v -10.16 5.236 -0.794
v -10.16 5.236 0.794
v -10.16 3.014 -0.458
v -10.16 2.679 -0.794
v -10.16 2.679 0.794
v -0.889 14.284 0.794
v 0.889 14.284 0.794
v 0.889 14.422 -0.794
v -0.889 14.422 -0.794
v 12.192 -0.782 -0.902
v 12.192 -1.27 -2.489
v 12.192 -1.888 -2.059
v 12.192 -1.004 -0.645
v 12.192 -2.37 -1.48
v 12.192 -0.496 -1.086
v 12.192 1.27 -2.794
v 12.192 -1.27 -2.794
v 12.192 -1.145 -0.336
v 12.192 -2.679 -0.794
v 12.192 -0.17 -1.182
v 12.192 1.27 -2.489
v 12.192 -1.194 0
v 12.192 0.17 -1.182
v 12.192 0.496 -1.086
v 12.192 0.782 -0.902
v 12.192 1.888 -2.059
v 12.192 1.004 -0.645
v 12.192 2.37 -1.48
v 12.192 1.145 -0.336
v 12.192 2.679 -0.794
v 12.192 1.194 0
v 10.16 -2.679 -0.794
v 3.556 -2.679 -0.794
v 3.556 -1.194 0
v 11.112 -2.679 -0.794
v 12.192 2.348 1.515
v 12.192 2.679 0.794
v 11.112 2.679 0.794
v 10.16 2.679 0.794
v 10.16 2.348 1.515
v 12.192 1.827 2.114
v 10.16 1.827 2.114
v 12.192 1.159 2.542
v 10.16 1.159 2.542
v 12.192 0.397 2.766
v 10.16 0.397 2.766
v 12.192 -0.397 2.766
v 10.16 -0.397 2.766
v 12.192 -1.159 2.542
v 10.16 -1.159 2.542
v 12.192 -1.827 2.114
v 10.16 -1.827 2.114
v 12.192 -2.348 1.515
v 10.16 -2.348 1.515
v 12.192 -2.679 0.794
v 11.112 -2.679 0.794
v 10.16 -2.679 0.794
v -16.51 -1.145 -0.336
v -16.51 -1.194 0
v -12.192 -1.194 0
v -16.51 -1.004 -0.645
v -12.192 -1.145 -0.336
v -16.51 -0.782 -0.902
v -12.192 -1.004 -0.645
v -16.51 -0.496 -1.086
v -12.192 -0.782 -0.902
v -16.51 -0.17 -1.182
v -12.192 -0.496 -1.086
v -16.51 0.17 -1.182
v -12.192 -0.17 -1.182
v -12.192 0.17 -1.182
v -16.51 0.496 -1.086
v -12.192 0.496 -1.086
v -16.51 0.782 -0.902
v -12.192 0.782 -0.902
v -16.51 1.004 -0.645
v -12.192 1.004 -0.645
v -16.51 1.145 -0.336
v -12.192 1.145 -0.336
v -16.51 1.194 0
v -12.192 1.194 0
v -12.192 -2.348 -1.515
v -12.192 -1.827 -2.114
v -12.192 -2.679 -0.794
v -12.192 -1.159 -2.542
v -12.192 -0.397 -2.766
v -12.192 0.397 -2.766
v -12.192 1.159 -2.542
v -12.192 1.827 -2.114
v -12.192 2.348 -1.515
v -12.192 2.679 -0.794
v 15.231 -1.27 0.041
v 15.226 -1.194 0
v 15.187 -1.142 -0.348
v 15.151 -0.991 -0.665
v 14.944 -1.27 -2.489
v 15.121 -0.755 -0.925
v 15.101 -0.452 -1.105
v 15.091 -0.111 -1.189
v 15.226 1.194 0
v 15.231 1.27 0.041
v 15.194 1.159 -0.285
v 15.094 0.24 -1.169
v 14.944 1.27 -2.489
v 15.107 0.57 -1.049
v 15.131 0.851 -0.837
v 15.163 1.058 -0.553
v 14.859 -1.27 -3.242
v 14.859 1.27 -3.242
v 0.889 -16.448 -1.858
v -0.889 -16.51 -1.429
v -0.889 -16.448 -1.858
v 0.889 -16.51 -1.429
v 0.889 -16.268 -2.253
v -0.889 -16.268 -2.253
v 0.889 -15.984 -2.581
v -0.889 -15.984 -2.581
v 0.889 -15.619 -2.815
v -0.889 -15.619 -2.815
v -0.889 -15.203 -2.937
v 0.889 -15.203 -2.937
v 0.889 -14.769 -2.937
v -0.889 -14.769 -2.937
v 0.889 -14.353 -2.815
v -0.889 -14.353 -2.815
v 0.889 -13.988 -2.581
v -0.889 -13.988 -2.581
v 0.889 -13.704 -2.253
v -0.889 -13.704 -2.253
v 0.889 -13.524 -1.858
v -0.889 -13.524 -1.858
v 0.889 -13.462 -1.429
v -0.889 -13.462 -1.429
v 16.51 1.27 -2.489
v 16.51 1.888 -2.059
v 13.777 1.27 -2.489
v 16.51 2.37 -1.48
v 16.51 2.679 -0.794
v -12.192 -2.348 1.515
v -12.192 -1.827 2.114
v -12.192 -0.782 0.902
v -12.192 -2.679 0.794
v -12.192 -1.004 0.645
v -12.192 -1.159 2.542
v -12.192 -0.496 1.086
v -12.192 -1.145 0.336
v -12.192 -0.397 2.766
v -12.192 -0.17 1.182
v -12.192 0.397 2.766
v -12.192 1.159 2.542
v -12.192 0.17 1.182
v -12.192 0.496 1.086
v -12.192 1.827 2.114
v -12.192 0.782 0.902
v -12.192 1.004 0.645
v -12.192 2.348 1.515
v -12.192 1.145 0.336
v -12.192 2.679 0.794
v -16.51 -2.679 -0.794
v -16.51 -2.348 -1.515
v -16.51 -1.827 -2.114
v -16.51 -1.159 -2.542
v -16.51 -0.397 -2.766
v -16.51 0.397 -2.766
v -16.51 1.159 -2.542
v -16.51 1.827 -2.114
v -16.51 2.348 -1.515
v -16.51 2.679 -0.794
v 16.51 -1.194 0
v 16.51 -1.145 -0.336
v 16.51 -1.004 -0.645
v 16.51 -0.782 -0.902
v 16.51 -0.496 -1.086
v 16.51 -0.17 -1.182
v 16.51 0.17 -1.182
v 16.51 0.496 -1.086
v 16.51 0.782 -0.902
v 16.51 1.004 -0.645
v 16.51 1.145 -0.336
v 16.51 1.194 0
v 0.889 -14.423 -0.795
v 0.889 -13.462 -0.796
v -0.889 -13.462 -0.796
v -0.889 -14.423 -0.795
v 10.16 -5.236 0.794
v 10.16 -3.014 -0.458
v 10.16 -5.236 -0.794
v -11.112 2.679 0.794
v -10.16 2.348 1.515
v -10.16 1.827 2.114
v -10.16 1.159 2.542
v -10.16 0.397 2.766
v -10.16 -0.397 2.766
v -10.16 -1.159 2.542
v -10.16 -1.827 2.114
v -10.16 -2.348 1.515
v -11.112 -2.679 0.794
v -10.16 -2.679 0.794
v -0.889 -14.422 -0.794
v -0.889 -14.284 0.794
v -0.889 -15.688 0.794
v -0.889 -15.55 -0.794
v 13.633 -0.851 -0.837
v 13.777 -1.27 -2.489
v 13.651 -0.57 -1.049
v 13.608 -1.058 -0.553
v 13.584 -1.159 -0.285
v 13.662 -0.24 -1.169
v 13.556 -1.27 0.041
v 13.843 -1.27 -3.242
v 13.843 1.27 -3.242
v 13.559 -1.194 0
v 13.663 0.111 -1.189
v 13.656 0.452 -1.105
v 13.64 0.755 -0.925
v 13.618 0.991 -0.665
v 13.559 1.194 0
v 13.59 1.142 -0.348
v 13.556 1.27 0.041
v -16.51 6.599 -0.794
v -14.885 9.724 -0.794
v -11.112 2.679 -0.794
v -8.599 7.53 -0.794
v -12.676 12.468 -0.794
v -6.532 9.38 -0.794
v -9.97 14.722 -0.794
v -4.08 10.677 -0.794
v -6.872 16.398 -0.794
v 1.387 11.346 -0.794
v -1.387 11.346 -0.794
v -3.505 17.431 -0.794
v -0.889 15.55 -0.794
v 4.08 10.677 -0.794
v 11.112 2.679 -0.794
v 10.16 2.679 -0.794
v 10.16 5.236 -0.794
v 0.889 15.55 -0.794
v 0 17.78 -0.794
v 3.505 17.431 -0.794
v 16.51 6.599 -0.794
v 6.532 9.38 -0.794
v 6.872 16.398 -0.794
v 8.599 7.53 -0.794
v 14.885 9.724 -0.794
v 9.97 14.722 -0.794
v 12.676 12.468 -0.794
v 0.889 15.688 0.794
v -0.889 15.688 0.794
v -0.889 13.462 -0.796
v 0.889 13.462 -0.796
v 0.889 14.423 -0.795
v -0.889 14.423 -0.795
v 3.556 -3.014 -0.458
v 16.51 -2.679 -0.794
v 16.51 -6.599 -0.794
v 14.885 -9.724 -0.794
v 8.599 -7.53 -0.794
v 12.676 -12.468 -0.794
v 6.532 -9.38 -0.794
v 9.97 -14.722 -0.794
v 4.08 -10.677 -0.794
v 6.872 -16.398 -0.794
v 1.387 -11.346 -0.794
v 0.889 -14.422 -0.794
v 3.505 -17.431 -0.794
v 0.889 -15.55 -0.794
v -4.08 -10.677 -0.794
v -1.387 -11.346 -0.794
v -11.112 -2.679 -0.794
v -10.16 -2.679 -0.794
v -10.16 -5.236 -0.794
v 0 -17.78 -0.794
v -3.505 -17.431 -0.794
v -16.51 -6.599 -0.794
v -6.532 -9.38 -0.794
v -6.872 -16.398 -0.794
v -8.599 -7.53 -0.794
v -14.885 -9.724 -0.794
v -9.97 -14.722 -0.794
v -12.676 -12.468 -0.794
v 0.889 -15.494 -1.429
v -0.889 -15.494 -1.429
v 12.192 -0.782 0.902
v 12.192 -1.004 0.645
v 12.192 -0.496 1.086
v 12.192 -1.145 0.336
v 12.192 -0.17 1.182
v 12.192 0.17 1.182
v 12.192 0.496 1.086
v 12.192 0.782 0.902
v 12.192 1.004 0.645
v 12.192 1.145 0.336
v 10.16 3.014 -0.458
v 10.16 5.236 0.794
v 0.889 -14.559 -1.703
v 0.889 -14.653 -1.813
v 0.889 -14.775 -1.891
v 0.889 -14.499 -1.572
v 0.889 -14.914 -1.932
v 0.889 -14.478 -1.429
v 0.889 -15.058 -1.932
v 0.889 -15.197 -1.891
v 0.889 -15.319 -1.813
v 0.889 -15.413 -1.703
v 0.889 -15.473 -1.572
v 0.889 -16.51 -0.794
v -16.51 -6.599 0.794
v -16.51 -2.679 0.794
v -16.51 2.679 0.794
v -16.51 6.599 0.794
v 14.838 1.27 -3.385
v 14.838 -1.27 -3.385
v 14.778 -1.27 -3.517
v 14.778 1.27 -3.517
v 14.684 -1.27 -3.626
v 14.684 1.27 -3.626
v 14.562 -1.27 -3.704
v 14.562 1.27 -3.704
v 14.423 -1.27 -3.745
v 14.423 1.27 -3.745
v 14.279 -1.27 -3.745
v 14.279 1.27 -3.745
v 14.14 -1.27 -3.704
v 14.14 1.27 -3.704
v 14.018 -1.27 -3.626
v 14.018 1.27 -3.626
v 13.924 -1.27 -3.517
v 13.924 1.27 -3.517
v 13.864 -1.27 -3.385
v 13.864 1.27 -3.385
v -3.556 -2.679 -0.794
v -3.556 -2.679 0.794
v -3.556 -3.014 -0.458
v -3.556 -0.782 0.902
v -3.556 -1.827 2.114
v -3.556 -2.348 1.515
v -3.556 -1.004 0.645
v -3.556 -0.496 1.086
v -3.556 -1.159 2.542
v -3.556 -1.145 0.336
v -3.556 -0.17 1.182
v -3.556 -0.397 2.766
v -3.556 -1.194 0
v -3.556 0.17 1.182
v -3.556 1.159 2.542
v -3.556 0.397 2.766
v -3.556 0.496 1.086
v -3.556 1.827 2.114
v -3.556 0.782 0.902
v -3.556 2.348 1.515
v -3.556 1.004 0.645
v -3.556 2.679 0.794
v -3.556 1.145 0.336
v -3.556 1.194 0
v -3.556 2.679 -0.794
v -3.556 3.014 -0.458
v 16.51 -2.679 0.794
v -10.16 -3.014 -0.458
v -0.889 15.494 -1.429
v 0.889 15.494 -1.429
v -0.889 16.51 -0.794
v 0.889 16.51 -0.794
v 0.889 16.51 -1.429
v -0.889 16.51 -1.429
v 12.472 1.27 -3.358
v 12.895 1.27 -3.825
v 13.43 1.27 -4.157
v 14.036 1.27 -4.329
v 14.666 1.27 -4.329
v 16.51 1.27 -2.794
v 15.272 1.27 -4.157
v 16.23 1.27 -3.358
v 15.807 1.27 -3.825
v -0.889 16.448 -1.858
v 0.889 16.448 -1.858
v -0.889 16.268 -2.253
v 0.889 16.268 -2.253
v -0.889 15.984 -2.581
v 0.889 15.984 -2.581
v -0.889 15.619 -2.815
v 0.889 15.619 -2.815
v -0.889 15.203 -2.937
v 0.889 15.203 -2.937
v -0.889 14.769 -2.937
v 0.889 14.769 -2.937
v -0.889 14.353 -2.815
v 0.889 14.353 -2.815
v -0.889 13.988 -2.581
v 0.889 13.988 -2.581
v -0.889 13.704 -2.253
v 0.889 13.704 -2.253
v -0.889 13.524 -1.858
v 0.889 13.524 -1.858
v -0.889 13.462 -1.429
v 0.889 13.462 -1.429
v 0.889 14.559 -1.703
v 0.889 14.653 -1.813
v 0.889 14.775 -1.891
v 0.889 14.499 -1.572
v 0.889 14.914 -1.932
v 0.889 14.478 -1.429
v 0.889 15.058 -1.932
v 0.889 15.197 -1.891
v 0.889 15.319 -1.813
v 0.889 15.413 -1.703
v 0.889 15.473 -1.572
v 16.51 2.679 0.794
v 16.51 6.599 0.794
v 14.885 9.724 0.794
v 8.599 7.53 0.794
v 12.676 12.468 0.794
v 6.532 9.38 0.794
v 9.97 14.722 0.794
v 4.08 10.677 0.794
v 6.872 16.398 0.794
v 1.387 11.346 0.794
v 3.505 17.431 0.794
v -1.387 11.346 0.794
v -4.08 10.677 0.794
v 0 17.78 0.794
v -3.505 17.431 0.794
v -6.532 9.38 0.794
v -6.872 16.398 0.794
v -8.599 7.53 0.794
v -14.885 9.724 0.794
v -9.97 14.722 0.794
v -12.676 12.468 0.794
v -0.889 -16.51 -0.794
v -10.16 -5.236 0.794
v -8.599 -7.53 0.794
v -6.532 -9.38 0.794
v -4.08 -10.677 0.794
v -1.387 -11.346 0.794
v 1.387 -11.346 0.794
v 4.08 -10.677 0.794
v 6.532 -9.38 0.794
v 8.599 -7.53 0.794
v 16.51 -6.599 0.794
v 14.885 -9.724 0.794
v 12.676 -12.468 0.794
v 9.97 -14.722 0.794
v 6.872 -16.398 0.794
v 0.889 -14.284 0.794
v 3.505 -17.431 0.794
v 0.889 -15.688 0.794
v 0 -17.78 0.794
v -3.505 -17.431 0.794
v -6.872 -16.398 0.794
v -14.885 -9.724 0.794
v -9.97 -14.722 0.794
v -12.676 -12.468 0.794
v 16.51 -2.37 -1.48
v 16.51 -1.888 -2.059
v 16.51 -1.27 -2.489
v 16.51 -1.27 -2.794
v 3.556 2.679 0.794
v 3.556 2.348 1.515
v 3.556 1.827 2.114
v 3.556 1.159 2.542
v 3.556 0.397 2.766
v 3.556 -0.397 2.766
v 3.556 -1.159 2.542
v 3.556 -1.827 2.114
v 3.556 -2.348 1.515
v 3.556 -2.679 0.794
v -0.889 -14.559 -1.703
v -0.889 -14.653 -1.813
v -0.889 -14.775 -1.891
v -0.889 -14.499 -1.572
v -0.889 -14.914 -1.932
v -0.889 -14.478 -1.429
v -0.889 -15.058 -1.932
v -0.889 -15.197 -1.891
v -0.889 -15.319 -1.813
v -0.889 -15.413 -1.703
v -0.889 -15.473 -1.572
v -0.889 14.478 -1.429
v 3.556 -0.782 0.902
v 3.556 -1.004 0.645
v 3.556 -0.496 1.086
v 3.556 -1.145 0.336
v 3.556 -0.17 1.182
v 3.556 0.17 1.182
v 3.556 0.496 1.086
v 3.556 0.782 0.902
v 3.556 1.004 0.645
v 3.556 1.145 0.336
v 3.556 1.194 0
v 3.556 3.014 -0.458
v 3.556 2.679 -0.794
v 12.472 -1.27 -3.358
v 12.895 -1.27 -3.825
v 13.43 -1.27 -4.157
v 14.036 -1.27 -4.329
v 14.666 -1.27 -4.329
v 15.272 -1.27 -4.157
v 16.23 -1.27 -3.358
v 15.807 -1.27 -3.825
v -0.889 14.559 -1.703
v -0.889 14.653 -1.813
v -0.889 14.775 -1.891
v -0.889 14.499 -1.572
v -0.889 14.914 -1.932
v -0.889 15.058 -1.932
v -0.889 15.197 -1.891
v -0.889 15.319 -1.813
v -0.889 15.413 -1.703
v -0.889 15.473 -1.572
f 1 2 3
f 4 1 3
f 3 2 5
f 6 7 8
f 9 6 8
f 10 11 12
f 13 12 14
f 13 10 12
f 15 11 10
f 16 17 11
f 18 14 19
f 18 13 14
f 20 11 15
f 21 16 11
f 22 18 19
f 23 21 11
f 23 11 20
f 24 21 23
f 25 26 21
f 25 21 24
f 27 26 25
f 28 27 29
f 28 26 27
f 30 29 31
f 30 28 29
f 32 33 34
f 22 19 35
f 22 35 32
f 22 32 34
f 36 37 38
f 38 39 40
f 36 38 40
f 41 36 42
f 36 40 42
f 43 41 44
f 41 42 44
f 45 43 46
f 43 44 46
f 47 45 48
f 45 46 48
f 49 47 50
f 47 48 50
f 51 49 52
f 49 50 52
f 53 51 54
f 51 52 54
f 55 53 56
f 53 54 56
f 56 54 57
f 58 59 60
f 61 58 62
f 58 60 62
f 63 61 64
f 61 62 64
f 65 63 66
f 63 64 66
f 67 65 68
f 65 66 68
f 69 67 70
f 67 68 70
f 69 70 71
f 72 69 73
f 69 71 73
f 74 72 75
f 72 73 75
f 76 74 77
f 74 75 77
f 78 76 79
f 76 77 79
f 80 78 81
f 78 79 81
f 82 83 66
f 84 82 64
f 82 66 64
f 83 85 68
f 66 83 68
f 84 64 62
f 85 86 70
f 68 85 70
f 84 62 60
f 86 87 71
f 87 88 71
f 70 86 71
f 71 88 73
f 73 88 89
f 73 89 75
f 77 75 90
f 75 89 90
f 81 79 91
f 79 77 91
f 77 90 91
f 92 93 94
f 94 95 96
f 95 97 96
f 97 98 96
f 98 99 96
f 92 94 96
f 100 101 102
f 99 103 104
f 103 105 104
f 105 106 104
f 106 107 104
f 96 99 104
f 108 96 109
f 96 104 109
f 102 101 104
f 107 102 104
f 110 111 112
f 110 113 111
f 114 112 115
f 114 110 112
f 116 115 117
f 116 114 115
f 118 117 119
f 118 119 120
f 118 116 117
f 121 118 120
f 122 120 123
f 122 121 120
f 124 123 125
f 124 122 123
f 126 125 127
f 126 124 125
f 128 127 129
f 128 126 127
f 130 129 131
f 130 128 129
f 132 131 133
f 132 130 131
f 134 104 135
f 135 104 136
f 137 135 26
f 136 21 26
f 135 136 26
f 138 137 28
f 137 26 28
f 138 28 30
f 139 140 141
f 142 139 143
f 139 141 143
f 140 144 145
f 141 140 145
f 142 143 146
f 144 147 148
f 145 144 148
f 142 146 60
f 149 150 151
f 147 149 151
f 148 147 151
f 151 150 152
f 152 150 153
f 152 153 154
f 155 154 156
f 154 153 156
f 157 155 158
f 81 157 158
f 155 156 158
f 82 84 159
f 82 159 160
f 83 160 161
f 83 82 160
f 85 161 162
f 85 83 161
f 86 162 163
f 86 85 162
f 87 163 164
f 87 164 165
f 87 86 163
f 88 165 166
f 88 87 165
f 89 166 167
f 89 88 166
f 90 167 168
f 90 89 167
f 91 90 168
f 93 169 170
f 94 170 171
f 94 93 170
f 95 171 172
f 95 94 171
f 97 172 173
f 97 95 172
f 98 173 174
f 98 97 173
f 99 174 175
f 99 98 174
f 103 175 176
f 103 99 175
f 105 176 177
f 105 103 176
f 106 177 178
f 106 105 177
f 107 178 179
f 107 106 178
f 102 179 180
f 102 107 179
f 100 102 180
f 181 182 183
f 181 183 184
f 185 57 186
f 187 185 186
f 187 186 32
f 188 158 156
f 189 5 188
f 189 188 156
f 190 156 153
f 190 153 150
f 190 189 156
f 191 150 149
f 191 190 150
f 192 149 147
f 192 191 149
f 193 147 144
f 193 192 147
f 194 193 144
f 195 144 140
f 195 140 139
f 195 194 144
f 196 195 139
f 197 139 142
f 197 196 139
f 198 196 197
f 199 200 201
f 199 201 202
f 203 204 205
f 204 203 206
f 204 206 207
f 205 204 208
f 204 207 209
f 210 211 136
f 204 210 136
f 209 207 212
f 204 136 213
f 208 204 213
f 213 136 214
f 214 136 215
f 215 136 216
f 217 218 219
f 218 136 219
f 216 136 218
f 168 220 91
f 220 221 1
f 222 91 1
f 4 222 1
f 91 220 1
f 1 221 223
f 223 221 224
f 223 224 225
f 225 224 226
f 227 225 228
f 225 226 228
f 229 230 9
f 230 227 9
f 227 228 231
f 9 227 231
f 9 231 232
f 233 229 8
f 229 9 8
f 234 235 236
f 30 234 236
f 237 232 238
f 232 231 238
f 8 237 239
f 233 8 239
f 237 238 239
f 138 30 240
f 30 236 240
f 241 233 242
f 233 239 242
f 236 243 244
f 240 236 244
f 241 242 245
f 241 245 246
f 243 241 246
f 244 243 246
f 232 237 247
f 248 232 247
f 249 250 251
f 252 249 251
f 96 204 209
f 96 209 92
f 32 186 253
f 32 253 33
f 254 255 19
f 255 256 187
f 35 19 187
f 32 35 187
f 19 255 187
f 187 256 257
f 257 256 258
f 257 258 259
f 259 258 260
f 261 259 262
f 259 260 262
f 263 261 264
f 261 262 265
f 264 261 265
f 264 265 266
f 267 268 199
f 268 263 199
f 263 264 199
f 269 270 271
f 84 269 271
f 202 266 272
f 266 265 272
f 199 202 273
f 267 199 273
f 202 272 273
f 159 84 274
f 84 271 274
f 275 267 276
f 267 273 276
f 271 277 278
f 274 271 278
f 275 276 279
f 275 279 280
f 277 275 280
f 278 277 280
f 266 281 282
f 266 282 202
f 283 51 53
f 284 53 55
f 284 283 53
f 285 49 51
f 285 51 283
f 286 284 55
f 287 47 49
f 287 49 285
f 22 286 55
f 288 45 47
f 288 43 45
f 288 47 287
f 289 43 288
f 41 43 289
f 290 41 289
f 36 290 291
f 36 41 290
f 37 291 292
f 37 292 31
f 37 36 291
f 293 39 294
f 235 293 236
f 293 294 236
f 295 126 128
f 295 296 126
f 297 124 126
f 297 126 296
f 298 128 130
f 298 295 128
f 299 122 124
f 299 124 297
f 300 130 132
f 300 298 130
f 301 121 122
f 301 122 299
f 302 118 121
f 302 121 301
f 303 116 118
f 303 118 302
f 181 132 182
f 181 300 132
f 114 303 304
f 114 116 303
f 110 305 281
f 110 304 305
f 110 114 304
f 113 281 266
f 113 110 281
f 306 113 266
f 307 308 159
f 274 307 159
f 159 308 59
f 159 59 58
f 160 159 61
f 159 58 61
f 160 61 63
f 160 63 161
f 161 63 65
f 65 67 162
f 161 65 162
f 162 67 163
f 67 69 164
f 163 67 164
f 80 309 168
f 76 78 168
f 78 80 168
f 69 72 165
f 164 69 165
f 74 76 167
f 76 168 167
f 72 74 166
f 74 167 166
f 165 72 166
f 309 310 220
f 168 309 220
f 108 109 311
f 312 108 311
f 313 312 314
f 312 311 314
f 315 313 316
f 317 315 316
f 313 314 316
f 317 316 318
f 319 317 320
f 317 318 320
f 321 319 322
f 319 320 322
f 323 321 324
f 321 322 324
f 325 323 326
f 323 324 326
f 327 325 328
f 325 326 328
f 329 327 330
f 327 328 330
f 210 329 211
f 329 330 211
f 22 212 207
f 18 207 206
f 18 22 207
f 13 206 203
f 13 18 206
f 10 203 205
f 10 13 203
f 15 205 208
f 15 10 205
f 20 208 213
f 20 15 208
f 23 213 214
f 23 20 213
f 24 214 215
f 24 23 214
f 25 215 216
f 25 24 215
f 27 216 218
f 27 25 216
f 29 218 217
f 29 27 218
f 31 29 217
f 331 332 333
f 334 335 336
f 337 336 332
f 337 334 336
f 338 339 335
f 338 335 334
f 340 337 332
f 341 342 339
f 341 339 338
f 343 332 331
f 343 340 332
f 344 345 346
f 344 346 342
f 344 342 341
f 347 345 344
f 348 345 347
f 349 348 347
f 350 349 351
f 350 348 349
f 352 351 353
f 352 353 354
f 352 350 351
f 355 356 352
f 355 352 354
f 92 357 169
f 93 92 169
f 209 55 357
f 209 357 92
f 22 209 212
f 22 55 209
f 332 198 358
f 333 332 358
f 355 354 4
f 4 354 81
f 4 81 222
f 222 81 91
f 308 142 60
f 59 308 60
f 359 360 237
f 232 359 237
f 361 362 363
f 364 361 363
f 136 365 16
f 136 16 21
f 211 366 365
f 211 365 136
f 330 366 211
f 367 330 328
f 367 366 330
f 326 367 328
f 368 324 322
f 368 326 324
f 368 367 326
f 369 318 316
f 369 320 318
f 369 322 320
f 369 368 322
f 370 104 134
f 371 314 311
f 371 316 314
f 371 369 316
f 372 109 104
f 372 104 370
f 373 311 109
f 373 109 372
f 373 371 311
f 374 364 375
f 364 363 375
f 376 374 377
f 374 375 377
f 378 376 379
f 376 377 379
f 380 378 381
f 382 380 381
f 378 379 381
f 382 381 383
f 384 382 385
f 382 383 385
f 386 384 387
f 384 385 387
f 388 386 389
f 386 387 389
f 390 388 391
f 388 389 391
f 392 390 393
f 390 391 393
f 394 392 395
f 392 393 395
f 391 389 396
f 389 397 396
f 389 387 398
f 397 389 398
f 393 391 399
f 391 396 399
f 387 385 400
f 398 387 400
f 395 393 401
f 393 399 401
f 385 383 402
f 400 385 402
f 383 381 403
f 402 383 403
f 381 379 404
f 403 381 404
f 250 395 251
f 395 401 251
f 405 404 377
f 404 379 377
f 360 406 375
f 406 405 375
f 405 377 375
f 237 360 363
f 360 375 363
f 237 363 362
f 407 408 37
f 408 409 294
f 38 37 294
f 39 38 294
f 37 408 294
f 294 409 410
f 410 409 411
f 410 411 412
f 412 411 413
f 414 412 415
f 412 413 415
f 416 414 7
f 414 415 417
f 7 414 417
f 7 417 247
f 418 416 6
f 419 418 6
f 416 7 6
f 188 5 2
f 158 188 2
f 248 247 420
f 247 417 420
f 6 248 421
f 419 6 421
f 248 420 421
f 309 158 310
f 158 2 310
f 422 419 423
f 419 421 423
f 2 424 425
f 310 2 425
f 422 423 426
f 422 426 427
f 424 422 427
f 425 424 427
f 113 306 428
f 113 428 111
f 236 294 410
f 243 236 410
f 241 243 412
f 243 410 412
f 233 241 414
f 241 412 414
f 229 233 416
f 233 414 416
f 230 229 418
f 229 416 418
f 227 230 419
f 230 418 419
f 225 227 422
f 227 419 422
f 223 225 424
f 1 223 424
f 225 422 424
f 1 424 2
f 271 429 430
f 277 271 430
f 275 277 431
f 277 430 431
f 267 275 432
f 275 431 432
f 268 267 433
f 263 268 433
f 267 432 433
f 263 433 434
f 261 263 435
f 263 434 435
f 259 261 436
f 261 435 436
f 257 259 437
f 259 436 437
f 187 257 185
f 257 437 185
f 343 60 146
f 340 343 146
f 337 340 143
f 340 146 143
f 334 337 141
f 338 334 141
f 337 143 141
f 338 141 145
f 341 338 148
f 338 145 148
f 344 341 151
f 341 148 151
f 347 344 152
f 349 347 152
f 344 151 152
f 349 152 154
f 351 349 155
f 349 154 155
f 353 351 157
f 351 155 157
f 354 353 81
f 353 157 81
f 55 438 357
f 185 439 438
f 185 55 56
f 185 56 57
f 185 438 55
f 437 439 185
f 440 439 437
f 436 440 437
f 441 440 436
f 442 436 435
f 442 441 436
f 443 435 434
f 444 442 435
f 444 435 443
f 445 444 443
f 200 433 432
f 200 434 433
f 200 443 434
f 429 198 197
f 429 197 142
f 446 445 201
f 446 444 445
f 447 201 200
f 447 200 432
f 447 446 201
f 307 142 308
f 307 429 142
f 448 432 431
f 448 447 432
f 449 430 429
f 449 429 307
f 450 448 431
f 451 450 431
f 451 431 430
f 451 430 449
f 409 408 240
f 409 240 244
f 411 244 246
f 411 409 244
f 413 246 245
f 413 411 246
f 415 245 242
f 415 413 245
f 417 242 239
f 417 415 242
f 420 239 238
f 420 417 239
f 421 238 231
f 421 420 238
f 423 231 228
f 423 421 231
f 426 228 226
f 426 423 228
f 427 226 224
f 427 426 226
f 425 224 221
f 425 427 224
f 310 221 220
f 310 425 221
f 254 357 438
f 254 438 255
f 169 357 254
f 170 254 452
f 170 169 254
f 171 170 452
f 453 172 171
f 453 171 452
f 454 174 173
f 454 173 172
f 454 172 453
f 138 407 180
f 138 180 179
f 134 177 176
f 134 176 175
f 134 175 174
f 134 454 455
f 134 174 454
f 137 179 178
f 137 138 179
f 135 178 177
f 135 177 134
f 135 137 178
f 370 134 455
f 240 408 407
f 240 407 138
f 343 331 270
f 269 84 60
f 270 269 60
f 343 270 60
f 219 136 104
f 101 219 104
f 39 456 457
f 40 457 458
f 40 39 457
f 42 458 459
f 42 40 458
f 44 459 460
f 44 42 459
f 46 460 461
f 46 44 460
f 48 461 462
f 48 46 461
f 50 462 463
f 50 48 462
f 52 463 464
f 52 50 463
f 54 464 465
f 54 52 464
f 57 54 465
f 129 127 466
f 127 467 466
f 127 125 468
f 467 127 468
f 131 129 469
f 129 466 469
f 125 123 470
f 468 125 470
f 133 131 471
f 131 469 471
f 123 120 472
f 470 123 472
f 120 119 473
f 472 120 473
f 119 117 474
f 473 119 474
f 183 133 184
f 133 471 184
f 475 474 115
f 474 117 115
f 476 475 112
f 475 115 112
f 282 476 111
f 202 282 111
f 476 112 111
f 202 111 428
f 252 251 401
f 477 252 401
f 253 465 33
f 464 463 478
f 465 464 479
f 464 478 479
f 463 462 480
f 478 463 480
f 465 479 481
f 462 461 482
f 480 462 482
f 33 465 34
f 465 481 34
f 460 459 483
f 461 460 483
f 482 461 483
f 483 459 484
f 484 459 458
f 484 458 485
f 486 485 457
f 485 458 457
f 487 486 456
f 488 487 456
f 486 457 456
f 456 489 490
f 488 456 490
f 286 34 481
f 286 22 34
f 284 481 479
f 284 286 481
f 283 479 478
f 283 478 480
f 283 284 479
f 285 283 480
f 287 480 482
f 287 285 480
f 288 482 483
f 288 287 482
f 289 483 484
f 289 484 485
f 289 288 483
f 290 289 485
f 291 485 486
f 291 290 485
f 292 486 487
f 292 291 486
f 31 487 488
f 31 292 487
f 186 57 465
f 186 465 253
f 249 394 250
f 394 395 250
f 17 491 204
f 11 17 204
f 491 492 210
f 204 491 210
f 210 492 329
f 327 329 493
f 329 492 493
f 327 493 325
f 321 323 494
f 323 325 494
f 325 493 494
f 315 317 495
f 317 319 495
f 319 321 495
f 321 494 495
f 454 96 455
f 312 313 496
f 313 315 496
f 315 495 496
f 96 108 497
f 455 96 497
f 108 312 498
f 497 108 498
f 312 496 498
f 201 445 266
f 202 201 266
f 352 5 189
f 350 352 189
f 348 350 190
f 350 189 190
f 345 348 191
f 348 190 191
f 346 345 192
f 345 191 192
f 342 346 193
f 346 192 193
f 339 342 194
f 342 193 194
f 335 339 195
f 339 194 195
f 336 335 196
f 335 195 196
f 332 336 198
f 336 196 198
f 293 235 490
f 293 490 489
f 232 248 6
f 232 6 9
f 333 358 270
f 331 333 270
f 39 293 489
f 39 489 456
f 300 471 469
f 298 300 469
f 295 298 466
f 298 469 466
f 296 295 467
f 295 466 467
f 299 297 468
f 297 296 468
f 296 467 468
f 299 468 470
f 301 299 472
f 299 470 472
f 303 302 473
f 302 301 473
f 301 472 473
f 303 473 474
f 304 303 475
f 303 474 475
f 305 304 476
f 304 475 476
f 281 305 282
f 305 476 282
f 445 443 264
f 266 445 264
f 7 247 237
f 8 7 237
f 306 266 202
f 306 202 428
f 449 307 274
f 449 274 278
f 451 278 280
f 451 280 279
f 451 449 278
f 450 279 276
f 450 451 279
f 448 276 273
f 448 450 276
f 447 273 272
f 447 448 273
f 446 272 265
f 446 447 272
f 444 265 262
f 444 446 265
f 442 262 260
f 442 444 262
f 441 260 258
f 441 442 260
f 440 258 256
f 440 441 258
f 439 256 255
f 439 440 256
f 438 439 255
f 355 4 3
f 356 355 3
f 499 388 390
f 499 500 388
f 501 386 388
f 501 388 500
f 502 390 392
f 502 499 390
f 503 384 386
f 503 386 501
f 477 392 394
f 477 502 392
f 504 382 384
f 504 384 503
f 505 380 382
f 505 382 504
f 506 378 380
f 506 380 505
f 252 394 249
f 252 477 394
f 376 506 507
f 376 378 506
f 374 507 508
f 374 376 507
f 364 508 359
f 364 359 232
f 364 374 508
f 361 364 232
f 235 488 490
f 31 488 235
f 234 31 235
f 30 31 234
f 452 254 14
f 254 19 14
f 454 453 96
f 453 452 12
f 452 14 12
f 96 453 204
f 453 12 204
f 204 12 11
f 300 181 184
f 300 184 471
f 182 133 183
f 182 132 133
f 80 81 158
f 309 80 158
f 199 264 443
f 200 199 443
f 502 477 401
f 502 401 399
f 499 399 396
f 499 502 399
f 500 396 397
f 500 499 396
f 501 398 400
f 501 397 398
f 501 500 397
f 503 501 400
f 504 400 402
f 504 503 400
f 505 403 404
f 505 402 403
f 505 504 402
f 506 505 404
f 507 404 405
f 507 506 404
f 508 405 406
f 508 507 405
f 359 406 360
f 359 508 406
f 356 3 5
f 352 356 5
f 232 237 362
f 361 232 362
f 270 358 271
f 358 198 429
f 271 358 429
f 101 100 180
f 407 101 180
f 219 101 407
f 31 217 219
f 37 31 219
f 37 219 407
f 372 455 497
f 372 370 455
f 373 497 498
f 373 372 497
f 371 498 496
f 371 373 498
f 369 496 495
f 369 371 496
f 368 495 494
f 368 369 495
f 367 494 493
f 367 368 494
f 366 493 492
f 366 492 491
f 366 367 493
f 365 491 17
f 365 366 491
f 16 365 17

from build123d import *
from build123d.topology import SkipClean

# Parameters (mm, degrees)
BOSS_EXTRUDE1_DEPTH                           = 0.79375
BOSS_EXTRUDE1_DEPTH_BACK                      = 0.79375
SKETCH1_R                                     = 17.78
SKETCH1_R_2                                   = 11.43
SKETCH20_R                                    = 2.794
BOSS_EXTRUDE7_DEPTH                           = 6.35
CUT_FOR_SCREW_CLEARANCE_ON_SIDE_DEPTH         = 26.39938485
CUT_FOR_AXLE_DEPTH                            = 33.174893036
CUT_FOR_AXLE_DEPTH_BACK                       = 33.174893036
SKETCH22_R                                    = 1.1938
CUT1_FOR_STRAIGHT_PULL_ON_AXLE_HOLE_DEPTH     = 2.032
CUT2_FOR_STRAIGHT_PULL_ON_AXLE_HOLE_DEPTH     = 34.878306426
X_AXIS_RING_DEPTH                             = 1.27
X_AXIS_RING_DEPTH_BACK                        = 1.27
SKETCH42_R                                    = 0.508
CUT_START                                     = -2.54
CUT_FOR_STRAIGHT_PULL_ON_X_AXIS_RING_DEPTH    = 2.54
Y_AXIS_CONTROL_WIRE_RING_DEPTH                = 0.889
Y_AXIS_CONTROL_WIRE_RING_DEPTH_BACK           = 0.889
SKETCH29_R                                    = 0.508
Y_AXIS_STRAIGHT_PULL_FEATURE_DEPTH            = 1.778
Y_AXIS_STRAIGHT_PULL_FEATURE_ON_MIRRORR_DEPTH = 1.778
BUILD_OUT_MATERIAL_FOR_AXLE_HOLE_DEPTH        = 1.5875
MIRROR17_COPY_1_DEPTH                         = 1.5875
CUT_EXTRUDE1_START                            = -2.032
CUT_EXTRUDE1_DEPTH                            = 2.032
CUT_EXTRUDE2_DEPTH                            = 35.042125789
BOSS_EXTRUDE8_DEPTH                           = 6.604


with BuildPart() as part:
    # Sketch1 → Boss-Extrude1 (new, two sides: drawn at the far end of the back side and taken through both)
    with BuildSketch(Plane.XY.offset(-BOSS_EXTRUDE1_DEPTH_BACK)):
        Circle(SKETCH1_R)
        Circle(SKETCH1_R_2, mode=Mode.SUBTRACT)
    extrude(amount=BOSS_EXTRUDE1_DEPTH + BOSS_EXTRUDE1_DEPTH_BACK)

    # Sketch20 → Boss-Extrude7 (add)
    with BuildSketch(Plane(origin=(10.16, 0, 0), x_dir=(0, 0, -1), z_dir=(1, 0, 0))):
        Circle(SKETCH20_R)
    boss_extrude7 = extrude(amount=BOSS_EXTRUDE7_DEPTH)

    # Sketch21 → cut for screw clearance on side (cut, through all)
    with BuildSketch(Plane.XY.offset(0.79375)):
        Polygon((16.51, 0), (16.51, 6.599113577), (17.78, 6.599113577), (17.78, 0), (17.78, -6.599113577), (16.51, -6.599113577), align=None)
    cut_for_screw_clearance_on_side = extrude(amount=-CUT_FOR_SCREW_CLEARANCE_ON_SIDE_DEPTH, mode=Mode.SUBTRACT)

    # Mirror1: Boss-Extrude7, cut for screw clearance on side across plane
    add(boss_extrude7.mirror(Plane(origin=(0, 0, 0), x_dir=(0, 0, 1), z_dir=(1, 0, 0))))
    add(cut_for_screw_clearance_on_side.mirror(Plane(origin=(0, 0, 0), x_dir=(0, 0, 1), z_dir=(1, 0, 0))), mode=Mode.SUBTRACT)

    # Sketch22 → cut for axle (cut, two sides: drawn at the far end of the back side and taken through both)
    with BuildSketch(Plane(origin=(10.16, 0, 0), x_dir=(0, 0, -1), z_dir=(1, 0, 0)).offset(-CUT_FOR_AXLE_DEPTH_BACK)):
        Circle(SKETCH22_R)
    extrude(amount=CUT_FOR_AXLE_DEPTH + CUT_FOR_AXLE_DEPTH_BACK, mode=Mode.SUBTRACT)

    # Sketch35 → cut1 for straight pull on axle hole (cut)
    with BuildSketch(Plane.ZY.offset(-10.16)):
        with BuildLine():
            Line((0, 1.1938), (-0.79375, 2.678879792))
            Line((-0.79375, 2.678879792), (-3.088550318, 2.678879792))
            Line((-3.088550318, 2.678879792), (-3.088550318, -2.678879792))
            Line((-3.088550318, -2.678879792), (-0.79375, -2.678879792))
            Line((-0.79375, -2.678879792), (0, -1.1938))
            ThreePointArc((0, -1.1938), (1.1938, 0), (0, 1.1938))
        make_face()
    extrude(amount=-CUT1_FOR_STRAIGHT_PULL_ON_AXLE_HOLE_DEPTH, mode=Mode.SUBTRACT)

    # Sketch41 → cut2 for straight pull on axle hole (cut, through all)
    with BuildSketch(Plane.ZY.offset(-12.192)):
        with BuildLine():
            Line((0, 1.1938), (0.79375, 2.678879792))
            Line((0.79375, 2.678879792), (3.158535805, 2.885771741))
            Line((3.158535805, 2.885771741), (3.158535805, -2.885771741))
            Line((3.158535805, -2.885771741), (0.79375, -2.678879792))
            Line((0.79375, -2.678879792), (0, -1.1938))
            ThreePointArc((0, -1.1938), (-1.1938, 0), (0, 1.1938))
        make_face()
    extrude(amount=-CUT2_FOR_STRAIGHT_PULL_ON_AXLE_HOLE_DEPTH, mode=Mode.SUBTRACT)

    # Sketch42 → x axis ring (add, two sides: drawn at the far end of the back side and taken through both)
    with BuildSketch(Plane(origin=(0, 0, 0), x_dir=(1, 0, 0), z_dir=(0, 1, 0)).offset(-X_AXIS_RING_DEPTH_BACK)):
        with BuildLine():
            Line((12.192, 2.794), (12.192, 2.392482279))
            Line((12.192, 2.392482279), (16.51, 2.392482279))
            Line((16.51, 2.392482279), (16.51, 2.794))
            ThreePointArc((16.51, 2.794), (14.351, 4.351221008), (12.192, 2.794))
        make_face()
        with Locations((14.351, 3.242227956)):
            Circle(SKETCH42_R, mode=Mode.SUBTRACT)
    extrude(amount=X_AXIS_RING_DEPTH + X_AXIS_RING_DEPTH_BACK)

    # Sketch43 → cut for straight pull on x axis ring (cut)
    with BuildSketch(Plane(origin=(0, 1.27, 0), x_dir=(1, 0, 0), z_dir=(0, 1, 0)).offset(CUT_START)):
        with BuildLine():
            Line((13.843, 3.242227956), (13.489897683, -0.79375))
            Line((13.489897683, -0.79375), (15.315854335, -0.79375))
            Line((15.315854335, -0.79375), (14.859, 3.242227956))
            ThreePointArc((14.859, 3.242227956), (14.351, 3.750227956), (13.843, 3.242227956))
        make_face()
    extrude(amount=CUT_FOR_STRAIGHT_PULL_ON_X_AXIS_RING_DEPTH, mode=Mode.SUBTRACT)


with BuildPart() as body_2:
    # Sketch29 → y axis control wire ring (new, two sides: drawn at the far end of the back side and taken through both)
    with BuildSketch(Plane(origin=(0, 0, 0), x_dir=(0, 0, -1), z_dir=(1, 0, 0)).offset(-Y_AXIS_CONTROL_WIRE_RING_DEPTH_BACK)):
        with BuildLine():
            Line((0.79375, 16.51), (1.42875, 16.51))
            ThreePointArc((1.42875, 16.51), (2.95275, 14.986), (1.42875, 13.462))
            Line((1.42875, 13.462), (0.795532055, 13.462))
            Line((0.795532055, 13.462), (0.79375, 16.51))
        make_face()
        with Locations((1.42875, 14.986)):
            Circle(SKETCH29_R, mode=Mode.SUBTRACT)
    extrude(amount=Y_AXIS_CONTROL_WIRE_RING_DEPTH + Y_AXIS_CONTROL_WIRE_RING_DEPTH_BACK)


with BuildPart() as y_axis_straight_pull_feature_tool:
    # Sketch30 → y axis straight pull feature (new body)
    with BuildSketch(Plane(origin=(0.889, 0, 0), x_dir=(0, 0, -1), z_dir=(1, 0, 0))):
        with BuildLine():
            Line((1.42875, 15.494), (-0.79375, 15.688443555))
            Line((-0.79375, 15.688443555), (-0.79375, 14.283556445))
            Line((-0.79375, 14.283556445), (1.42875, 14.478))
            ThreePointArc((1.42875, 14.478), (1.93675, 14.986), (1.42875, 15.494))
        make_face()
    extrude(amount=-Y_AXIS_STRAIGHT_PULL_FEATURE_DEPTH)


with BuildPart() as part_1:
    add(part.part)

    # y axis straight pull feature: cut by y_axis_straight_pull_feature_tool
    add(y_axis_straight_pull_feature_tool.part, mode=Mode.SUBTRACT)

    # Sketch31 → y axis straight pull feature on mirrorr (cut)
    with BuildSketch(Plane(origin=(0.889, 0, 0), x_dir=(0, 0, -1), z_dir=(1, 0, 0))):
        with BuildLine():
            Line((1.42875, -14.478), (-0.79375, -14.283556445))
            Line((-0.79375, -14.283556445), (-0.79375, -15.688443555))
            Line((-0.79375, -15.688443555), (1.42875, -15.494))
            ThreePointArc((1.42875, -15.494), (1.93675, -14.986), (1.42875, -14.478))
        make_face()
    extrude(amount=-Y_AXIS_STRAIGHT_PULL_FEATURE_ON_MIRRORR_DEPTH, mode=Mode.SUBTRACT)

    # Sketch40 → build out material for axle hole (add)
    with BuildSketch(Plane.XY.offset(0.79375)):
        Polygon((10.16, 5.249781847), (10.16, 2.678879792), (11.111638181, 2.678879792), (10.736884246, 4.372121259), align=None)
    build_out_material_for_axle_hole = extrude(amount=-BUILD_OUT_MATERIAL_FOR_AXLE_HOLE_DEPTH)

    # Mirror16: build out material for axle hole across plane
    add(build_out_material_for_axle_hole.mirror(Plane.ZX))

    # Mirror17: build out material for axle hole across plane
    add(build_out_material_for_axle_hole.mirror(Plane(origin=(0, 0, 0), x_dir=(0, 0, 1), z_dir=(1, 0, 0))))

    # Mirror17 copy 1 sketch → Mirror17 copy 1 (add)
    with BuildSketch(Plane(origin=(0, 0, 0.79375), x_dir=(-1, 0, 0), z_dir=(0, 0, 1))):
        Polygon((10.16, 5.249781847), (10.16, 2.678879792), (11.111638181, 2.678879792), (10.736884246, 4.372121259), align=None)
    extrude(amount=-MIRROR17_COPY_1_DEPTH)

    # Sketch44 → Cut-Extrude1 (cut)
    with SkipClean():  # the faces are left unmerged after this step: merging them gives an invalid solid
        with BuildSketch(Plane(origin=(-10.16, 0, 0), x_dir=(0, 0, -1), z_dir=(1, 0, 0)).offset(CUT_EXTRUDE1_START)):
            with BuildLine():
                Line((0, 1.1938), (0.79375, 2.678879792))
                Line((0.79375, 2.678879792), (4.74590947, 2.678879792))
                Line((4.74590947, 2.678879792), (4.74590947, -2.678879792))
                Line((4.74590947, -2.678879792), (0.79375, -2.678879792))
                Line((0.79375, -2.678879792), (0, -1.1938))
                ThreePointArc((0, -1.1938), (-1.1938, 0), (0, 1.1938))
            make_face()
        extrude(amount=CUT_EXTRUDE1_DEPTH, mode=Mode.SUBTRACT)

    # Sketch45 → Cut-Extrude2 (cut, through all)
    with BuildSketch(Plane(origin=(-12.192, 0, 0), x_dir=(0, 0, -1), z_dir=(1, 0, 0))):
        with BuildLine():
            Line((0, 1.1938), (-0.79375, 2.678879792))
            Line((-0.79375, 2.678879792), (-3.136476286, 2.678879792))
            Line((-3.136476286, 2.678879792), (-3.136476286, -2.678879792))
            Line((-3.136476286, -2.678879792), (-0.79375, -2.678879792))
            Line((-0.79375, -2.678879792), (0, -1.1938))
            ThreePointArc((0, -1.1938), (1.1938, 0), (0, 1.1938))
        make_face()
    extrude(amount=-CUT_EXTRUDE2_DEPTH, mode=Mode.SUBTRACT)

    # Sketch46 → Boss-Extrude8 (add)
    with BuildSketch(Plane(origin=(-10.16, 0, 0), x_dir=(0, 0, -1), z_dir=(1, 0, 0))):
        with BuildLine():
            Line((0.79375, 2.678879792), (0.458271776, 3.014358015))
            Line((0.458271776, 3.014358015), (-0.79375, 2.678879792))
            ThreePointArc((-0.79375, 2.678879792), (-2.794, 0), (-0.79375, -2.678879792))
            Line((-0.79375, -2.678879792), (0.458271776, -3.014358015))
            Line((0.458271776, -3.014358015), (0.79375, -2.678879792))
            Line((0.79375, -2.678879792), (0, -1.1938))
            ThreePointArc((0, -1.1938), (-1.1938, 0), (0, 1.1938))
            Line((0, 1.1938), (0.79375, 2.678879792))
        make_face()
    boss_extrude8 = extrude(amount=BOSS_EXTRUDE8_DEPTH)

    # Mirror19: Boss-Extrude8 across plane
    add(boss_extrude8.mirror(Plane(origin=(0, 0, 0), x_dir=(0, 0, 1), z_dir=(1, 0, 0))))


with BuildPart() as body_2_1:
    add(body_2.part)

    # y axis straight pull feature: cut by y_axis_straight_pull_feature_tool
    add(y_axis_straight_pull_feature_tool.part, mode=Mode.SUBTRACT)


with BuildPart() as body_3:
    # mirror of y ring: mirrored copy
    add(body_2_1.part.mirror(Plane.ZX))


solid = Compound([part_1.part, body_2_1.part, body_3.part])
